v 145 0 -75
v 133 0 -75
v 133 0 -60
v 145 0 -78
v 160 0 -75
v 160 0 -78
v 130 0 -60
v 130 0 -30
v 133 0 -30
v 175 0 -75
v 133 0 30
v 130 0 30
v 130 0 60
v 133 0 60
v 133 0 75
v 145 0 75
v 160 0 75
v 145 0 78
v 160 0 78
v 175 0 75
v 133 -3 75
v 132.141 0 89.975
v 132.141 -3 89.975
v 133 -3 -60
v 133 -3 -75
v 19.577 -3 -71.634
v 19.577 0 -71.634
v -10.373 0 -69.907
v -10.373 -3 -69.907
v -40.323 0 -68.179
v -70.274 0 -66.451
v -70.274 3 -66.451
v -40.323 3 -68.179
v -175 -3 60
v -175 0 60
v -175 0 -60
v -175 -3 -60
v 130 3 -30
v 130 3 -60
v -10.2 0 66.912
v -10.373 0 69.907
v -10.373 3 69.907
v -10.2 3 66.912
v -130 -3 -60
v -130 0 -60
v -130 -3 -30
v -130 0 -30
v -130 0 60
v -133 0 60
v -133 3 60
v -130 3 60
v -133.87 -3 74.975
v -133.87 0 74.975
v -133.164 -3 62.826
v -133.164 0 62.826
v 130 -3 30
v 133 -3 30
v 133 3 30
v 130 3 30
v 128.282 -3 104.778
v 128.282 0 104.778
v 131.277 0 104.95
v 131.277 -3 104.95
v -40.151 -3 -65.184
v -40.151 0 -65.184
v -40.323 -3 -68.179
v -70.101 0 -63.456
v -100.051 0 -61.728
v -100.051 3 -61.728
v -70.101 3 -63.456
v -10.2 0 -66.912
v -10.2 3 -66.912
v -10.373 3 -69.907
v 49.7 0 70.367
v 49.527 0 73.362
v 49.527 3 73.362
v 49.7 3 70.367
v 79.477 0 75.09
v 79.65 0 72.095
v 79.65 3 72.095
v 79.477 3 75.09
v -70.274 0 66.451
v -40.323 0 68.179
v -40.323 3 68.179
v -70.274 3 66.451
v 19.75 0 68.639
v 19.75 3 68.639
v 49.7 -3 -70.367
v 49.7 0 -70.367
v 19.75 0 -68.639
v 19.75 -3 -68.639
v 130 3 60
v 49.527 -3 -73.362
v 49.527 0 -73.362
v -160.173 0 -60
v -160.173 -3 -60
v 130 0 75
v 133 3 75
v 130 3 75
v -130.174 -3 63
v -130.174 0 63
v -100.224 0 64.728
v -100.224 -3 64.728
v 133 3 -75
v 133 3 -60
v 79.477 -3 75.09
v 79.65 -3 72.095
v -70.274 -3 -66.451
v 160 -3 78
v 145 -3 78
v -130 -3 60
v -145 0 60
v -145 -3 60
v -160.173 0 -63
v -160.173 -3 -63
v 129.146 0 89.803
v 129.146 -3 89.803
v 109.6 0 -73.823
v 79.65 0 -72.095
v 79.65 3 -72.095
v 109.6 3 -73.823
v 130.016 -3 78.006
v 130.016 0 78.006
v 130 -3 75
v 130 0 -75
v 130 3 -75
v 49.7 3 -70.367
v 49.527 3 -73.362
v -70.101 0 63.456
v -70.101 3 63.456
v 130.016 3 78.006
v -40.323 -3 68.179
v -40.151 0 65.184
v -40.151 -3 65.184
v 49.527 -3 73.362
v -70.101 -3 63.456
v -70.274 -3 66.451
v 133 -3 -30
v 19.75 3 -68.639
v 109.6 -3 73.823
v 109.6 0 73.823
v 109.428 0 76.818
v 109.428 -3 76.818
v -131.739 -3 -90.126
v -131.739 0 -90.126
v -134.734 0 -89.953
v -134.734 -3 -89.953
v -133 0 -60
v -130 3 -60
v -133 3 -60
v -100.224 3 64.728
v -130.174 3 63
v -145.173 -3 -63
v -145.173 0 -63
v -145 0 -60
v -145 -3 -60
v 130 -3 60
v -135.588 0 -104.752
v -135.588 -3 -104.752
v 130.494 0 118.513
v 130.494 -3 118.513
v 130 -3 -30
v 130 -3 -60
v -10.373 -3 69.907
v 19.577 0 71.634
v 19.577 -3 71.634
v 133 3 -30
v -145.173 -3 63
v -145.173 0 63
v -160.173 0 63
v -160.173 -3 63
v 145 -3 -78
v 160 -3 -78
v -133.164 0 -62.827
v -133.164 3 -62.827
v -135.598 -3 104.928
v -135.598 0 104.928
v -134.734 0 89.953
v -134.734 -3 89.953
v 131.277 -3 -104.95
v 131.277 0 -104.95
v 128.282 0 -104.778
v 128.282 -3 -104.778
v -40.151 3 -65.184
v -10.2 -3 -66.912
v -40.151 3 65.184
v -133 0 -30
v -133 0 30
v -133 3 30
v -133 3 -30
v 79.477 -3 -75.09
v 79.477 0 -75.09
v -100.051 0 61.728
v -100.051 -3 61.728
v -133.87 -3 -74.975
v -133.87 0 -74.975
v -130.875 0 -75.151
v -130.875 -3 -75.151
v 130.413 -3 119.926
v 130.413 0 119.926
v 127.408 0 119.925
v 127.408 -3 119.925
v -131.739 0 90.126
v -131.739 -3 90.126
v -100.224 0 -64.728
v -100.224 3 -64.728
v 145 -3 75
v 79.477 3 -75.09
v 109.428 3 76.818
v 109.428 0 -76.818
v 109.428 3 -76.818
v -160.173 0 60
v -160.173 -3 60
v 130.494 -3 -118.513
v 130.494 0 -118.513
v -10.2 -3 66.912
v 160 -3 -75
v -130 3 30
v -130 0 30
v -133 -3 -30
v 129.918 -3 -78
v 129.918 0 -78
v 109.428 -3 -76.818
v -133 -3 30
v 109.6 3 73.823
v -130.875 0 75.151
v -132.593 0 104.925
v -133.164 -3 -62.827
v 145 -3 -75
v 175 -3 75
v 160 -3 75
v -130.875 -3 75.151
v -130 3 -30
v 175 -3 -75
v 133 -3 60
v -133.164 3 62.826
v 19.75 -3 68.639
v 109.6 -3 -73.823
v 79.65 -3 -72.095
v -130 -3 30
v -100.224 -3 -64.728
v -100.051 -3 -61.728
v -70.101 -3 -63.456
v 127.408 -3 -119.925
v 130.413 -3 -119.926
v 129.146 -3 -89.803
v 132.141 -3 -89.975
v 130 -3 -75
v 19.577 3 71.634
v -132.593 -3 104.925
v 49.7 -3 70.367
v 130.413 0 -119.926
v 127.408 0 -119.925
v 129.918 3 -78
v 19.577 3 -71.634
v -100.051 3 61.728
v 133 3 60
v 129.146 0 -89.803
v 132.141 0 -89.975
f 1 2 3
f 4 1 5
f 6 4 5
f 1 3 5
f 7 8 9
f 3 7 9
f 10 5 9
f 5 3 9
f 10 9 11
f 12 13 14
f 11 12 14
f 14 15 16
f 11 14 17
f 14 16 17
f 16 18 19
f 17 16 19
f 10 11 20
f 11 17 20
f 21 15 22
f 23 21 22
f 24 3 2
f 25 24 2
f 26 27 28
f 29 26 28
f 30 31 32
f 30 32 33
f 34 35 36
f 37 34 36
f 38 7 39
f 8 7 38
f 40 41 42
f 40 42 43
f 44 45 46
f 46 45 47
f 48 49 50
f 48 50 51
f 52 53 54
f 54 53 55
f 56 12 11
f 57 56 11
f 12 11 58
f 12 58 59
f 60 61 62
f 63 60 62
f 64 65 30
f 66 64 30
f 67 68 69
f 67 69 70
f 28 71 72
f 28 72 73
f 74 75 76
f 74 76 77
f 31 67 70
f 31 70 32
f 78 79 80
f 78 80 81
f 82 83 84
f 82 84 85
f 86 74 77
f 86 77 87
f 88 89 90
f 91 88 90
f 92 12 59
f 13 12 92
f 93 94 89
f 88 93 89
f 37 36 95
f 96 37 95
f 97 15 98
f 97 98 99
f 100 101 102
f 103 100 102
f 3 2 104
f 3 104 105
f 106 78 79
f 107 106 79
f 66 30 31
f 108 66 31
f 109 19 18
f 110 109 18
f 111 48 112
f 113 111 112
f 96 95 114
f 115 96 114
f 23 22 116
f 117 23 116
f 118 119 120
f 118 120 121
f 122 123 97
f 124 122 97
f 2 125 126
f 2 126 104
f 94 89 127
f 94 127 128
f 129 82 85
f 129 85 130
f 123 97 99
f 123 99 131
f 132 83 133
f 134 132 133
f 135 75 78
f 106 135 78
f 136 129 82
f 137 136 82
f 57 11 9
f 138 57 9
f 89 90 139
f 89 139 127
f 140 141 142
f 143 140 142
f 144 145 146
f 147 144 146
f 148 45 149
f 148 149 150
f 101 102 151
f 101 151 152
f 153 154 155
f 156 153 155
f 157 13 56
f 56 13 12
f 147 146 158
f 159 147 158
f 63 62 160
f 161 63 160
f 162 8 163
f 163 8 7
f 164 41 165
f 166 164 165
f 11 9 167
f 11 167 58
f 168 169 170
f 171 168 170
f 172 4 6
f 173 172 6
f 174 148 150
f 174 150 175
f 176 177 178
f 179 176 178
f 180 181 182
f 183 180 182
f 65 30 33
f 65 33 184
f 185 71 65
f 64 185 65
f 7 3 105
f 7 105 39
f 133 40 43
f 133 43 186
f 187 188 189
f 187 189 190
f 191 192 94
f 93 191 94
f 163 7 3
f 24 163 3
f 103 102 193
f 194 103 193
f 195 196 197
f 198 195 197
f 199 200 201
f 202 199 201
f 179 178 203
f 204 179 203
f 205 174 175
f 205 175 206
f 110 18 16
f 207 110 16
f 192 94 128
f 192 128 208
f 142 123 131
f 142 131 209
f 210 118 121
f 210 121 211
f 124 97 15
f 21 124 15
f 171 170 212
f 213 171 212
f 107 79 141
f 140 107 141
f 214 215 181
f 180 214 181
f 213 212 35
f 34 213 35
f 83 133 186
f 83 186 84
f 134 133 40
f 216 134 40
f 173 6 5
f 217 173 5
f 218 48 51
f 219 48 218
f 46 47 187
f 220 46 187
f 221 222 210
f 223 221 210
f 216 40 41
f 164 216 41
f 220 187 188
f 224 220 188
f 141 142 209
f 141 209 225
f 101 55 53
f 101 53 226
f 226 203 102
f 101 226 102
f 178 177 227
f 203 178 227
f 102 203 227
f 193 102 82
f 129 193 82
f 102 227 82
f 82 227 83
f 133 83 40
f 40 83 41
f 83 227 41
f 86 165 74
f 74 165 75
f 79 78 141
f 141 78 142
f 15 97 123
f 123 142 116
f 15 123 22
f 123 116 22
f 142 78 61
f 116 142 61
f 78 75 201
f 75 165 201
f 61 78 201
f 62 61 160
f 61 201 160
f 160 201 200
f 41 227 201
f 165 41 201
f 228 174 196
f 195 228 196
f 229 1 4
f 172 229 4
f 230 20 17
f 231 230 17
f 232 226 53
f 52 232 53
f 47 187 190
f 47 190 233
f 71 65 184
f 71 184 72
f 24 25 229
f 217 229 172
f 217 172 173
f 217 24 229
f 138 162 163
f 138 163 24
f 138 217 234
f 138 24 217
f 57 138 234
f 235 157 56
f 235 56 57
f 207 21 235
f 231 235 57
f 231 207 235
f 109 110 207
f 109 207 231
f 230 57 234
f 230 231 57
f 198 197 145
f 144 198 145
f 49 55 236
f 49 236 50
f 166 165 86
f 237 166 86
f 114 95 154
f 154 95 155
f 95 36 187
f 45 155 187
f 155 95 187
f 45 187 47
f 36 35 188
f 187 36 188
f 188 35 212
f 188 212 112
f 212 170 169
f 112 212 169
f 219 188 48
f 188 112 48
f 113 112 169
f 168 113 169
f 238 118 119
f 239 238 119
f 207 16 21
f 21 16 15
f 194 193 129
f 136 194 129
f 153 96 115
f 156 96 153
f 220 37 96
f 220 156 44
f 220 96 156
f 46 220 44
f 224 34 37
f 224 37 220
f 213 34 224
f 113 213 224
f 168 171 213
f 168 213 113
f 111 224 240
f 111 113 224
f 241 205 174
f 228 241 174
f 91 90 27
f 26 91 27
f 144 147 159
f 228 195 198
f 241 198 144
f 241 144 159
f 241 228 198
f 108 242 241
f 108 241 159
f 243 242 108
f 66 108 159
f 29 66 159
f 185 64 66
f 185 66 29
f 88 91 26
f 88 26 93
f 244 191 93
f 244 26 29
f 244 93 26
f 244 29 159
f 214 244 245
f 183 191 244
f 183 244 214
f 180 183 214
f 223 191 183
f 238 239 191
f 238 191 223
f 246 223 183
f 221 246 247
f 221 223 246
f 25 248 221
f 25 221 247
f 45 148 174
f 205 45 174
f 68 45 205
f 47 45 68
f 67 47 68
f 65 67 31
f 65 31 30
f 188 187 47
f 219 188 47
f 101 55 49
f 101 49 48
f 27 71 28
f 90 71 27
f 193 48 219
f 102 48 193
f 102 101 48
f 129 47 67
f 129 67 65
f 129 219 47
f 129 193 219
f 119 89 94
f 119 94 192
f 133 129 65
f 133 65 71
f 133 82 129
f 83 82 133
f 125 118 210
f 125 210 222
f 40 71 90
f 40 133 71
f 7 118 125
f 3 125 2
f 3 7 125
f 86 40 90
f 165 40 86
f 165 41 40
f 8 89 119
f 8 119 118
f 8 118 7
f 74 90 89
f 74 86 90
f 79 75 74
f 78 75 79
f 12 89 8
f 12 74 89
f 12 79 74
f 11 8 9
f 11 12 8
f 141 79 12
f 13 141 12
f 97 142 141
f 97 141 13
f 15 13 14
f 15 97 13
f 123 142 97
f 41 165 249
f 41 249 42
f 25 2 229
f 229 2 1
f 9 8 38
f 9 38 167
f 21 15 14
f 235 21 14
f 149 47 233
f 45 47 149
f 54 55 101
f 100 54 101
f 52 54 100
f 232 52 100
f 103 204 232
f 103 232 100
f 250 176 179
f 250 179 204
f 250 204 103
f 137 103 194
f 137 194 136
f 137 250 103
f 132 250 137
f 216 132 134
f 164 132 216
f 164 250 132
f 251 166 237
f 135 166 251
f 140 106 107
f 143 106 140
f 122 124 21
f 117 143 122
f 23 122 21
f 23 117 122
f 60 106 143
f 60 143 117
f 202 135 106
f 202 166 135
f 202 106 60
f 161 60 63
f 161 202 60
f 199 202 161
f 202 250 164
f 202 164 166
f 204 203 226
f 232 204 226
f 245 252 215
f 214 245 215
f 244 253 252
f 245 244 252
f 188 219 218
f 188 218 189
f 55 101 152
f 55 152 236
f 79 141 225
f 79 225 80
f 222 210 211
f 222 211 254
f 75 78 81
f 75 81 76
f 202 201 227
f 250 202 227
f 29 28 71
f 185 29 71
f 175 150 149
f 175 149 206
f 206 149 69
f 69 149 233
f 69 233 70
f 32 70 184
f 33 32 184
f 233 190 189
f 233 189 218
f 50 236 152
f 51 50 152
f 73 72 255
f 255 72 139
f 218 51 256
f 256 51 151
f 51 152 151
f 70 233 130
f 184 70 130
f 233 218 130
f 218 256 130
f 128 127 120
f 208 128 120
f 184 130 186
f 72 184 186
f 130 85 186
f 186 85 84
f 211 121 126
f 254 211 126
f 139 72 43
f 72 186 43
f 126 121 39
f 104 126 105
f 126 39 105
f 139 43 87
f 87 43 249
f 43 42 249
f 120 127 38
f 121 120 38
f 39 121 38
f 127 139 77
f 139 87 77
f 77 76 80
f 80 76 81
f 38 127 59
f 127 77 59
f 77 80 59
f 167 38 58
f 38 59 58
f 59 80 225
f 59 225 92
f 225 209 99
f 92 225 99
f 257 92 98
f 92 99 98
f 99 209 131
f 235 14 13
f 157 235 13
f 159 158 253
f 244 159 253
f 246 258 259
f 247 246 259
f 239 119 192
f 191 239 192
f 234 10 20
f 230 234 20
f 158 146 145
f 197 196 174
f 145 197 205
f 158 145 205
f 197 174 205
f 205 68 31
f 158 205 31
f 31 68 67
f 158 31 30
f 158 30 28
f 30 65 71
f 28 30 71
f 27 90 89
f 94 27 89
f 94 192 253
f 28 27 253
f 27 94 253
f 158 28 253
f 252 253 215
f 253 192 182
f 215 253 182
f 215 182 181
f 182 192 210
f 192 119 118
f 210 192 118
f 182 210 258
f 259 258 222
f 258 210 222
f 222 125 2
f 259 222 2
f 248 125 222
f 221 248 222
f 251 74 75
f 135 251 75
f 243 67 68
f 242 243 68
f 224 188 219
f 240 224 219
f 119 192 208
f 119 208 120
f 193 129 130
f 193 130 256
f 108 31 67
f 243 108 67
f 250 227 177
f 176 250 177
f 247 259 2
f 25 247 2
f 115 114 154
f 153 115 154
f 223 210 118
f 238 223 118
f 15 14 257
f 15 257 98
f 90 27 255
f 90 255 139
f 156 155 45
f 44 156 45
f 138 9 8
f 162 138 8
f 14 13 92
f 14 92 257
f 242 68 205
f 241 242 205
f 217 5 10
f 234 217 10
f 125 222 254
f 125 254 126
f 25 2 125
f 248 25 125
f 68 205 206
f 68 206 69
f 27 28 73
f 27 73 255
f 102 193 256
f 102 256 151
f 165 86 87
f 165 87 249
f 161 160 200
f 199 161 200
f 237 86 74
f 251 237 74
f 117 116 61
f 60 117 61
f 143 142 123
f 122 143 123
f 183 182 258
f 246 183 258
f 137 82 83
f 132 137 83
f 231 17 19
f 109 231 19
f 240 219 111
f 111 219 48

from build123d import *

# Parameters (mm, degrees)
F1_DEPTH = 3
F2_DEPTH = 3


with BuildPart() as f1:
    # F0 (on Front) → F1 (new body)
    with BuildSketch(Plane.XZ):
        Polygon((-130, 60), (-133, 60), (-145, 60), (-145.173077, 63), (-160.173077, 63), (-160.173077, 60), (-175, 60), (-175, 0), (-175, -60), (-160.173077, -60), (-160.173077, -63), (-145.173077, -63), (-145, -60), (-133, -60), (-130, -60), (-130, -30), (-133, -30), (-133, 0), (-133, 30), (-130, 30), align=None)
        Polygon((-100.224086, -64.727896), (-133.164295, -62.827499), (-133.870123, -74.974742), (-130.875289, -75.15075), (-131.739237, -90.125849), (-134.734257, -89.95306), (-135.588067, -104.752438), (127.40768, -119.92527), (130.412652, -119.925556), (130.494158, -118.512793), (131.2766, -104.950457), (128.28158, -104.777667), (129.145528, -89.802568), (132.140548, -89.975358), (133, -75), (130, -75), (129.918192, -78.000269), (109.427593, -76.818119), (109.600383, -73.823099), (79.650184, -72.095203), (79.477395, -75.090223), (49.527197, -73.362327), (49.699986, -70.367307), (19.749788, -68.639411), (19.576998, -71.634431), (-10.3732, -69.906535), (-10.20041, -66.911515), (-40.150609, -65.183619), (-40.323398, -68.178639), (-70.273596, -66.450743), (-70.100807, -63.455723), (-100.051005, -61.727827), align=None)
        Polygon((-130.174284, 63), (-100.224086, 64.727896), (-100.051005, 61.727827), (-70.100807, 63.455723), (-70.273596, 66.450743), (-40.323398, 68.178639), (-40.150609, 65.183619), (-10.20041, 66.911515), (-10.3732, 69.906535), (19.576998, 71.634431), (19.749788, 68.639411), (49.699986, 70.367307), (49.527197, 73.362327), (79.477395, 75.090223), (79.650184, 72.095203), (109.600383, 73.823099), (109.427593, 76.818119), (130.015937, 78.005908), (130, 75), (133, 75), (132.140548, 89.975358), (129.145528, 89.802568), (128.28158, 104.777667), (131.2766, 104.950457), (130.494158, 118.512793), (130.412652, 119.925556), (127.40768, 119.92527), (-132.593047, 104.925228), (-135.598205, 104.928159), (-134.734257, 89.95306), (-131.739237, 90.125849), (-130.875289, 75.15075), (-133.870123, 74.974742), (-133.164225, 62.8263), align=None)
        Polygon((145, 75), (133, 75), (133, 60), (130, 60), (130, 30), (133, 30), (133, 0), (133, -30), (130, -30), (130, -60), (133, -60), (133, -75), (145, -75), (145, -78), (160, -78), (160, -75), (175, -75), (175, 0), (175, 75), (160, 75), (160, 78), (145, 78), align=None)
    extrude(amount=F1_DEPTH)


with BuildPart() as f2:
    # F0 (on Front) → F2 (new body)
    with BuildSketch(Plane.XZ):
        Polygon((-100.051005, 61.727827), (-100.224086, 64.727896), (-130.174284, 63), (-133.164225, 62.8263), (-133, 60), (-130, 60), (-130, 30), (-133, 30), (-133, 0), (-133, -30), (-130, -30), (-130, -60), (-133, -60), (-133.164295, -62.827499), (-100.224086, -64.727896), (-100.051005, -61.727827), (-70.100807, -63.455723), (-70.273596, -66.450743), (-40.323398, -68.178639), (-40.150609, -65.183619), (-10.20041, -66.911515), (-10.3732, -69.906535), (19.576998, -71.634431), (19.749788, -68.639411), (49.699986, -70.367307), (49.527197, -73.362327), (79.477395, -75.090223), (79.650184, -72.095203), (109.600383, -73.823099), (109.427593, -76.818119), (129.918192, -78.000269), (130, -75), (133, -75), (133, -60), (130, -60), (130, -30), (133, -30), (133, 0), (133, 30), (130, 30), (130, 60), (133, 60), (133, 75), (130, 75), (130.015937, 78.005908), (109.427593, 76.818119), (109.600383, 73.823099), (79.650184, 72.095203), (79.477395, 75.090223), (49.527197, 73.362327), (49.699986, 70.367307), (19.749788, 68.639411), (19.576998, 71.634431), (-10.3732, 69.906535), (-10.20041, 66.911515), (-40.150609, 65.183619), (-40.323398, 68.178639), (-70.273596, 66.450743), (-70.100807, 63.455723), align=None)
    extrude(amount=-F2_DEPTH)


solid = Compound([f1.part, f2.part])
